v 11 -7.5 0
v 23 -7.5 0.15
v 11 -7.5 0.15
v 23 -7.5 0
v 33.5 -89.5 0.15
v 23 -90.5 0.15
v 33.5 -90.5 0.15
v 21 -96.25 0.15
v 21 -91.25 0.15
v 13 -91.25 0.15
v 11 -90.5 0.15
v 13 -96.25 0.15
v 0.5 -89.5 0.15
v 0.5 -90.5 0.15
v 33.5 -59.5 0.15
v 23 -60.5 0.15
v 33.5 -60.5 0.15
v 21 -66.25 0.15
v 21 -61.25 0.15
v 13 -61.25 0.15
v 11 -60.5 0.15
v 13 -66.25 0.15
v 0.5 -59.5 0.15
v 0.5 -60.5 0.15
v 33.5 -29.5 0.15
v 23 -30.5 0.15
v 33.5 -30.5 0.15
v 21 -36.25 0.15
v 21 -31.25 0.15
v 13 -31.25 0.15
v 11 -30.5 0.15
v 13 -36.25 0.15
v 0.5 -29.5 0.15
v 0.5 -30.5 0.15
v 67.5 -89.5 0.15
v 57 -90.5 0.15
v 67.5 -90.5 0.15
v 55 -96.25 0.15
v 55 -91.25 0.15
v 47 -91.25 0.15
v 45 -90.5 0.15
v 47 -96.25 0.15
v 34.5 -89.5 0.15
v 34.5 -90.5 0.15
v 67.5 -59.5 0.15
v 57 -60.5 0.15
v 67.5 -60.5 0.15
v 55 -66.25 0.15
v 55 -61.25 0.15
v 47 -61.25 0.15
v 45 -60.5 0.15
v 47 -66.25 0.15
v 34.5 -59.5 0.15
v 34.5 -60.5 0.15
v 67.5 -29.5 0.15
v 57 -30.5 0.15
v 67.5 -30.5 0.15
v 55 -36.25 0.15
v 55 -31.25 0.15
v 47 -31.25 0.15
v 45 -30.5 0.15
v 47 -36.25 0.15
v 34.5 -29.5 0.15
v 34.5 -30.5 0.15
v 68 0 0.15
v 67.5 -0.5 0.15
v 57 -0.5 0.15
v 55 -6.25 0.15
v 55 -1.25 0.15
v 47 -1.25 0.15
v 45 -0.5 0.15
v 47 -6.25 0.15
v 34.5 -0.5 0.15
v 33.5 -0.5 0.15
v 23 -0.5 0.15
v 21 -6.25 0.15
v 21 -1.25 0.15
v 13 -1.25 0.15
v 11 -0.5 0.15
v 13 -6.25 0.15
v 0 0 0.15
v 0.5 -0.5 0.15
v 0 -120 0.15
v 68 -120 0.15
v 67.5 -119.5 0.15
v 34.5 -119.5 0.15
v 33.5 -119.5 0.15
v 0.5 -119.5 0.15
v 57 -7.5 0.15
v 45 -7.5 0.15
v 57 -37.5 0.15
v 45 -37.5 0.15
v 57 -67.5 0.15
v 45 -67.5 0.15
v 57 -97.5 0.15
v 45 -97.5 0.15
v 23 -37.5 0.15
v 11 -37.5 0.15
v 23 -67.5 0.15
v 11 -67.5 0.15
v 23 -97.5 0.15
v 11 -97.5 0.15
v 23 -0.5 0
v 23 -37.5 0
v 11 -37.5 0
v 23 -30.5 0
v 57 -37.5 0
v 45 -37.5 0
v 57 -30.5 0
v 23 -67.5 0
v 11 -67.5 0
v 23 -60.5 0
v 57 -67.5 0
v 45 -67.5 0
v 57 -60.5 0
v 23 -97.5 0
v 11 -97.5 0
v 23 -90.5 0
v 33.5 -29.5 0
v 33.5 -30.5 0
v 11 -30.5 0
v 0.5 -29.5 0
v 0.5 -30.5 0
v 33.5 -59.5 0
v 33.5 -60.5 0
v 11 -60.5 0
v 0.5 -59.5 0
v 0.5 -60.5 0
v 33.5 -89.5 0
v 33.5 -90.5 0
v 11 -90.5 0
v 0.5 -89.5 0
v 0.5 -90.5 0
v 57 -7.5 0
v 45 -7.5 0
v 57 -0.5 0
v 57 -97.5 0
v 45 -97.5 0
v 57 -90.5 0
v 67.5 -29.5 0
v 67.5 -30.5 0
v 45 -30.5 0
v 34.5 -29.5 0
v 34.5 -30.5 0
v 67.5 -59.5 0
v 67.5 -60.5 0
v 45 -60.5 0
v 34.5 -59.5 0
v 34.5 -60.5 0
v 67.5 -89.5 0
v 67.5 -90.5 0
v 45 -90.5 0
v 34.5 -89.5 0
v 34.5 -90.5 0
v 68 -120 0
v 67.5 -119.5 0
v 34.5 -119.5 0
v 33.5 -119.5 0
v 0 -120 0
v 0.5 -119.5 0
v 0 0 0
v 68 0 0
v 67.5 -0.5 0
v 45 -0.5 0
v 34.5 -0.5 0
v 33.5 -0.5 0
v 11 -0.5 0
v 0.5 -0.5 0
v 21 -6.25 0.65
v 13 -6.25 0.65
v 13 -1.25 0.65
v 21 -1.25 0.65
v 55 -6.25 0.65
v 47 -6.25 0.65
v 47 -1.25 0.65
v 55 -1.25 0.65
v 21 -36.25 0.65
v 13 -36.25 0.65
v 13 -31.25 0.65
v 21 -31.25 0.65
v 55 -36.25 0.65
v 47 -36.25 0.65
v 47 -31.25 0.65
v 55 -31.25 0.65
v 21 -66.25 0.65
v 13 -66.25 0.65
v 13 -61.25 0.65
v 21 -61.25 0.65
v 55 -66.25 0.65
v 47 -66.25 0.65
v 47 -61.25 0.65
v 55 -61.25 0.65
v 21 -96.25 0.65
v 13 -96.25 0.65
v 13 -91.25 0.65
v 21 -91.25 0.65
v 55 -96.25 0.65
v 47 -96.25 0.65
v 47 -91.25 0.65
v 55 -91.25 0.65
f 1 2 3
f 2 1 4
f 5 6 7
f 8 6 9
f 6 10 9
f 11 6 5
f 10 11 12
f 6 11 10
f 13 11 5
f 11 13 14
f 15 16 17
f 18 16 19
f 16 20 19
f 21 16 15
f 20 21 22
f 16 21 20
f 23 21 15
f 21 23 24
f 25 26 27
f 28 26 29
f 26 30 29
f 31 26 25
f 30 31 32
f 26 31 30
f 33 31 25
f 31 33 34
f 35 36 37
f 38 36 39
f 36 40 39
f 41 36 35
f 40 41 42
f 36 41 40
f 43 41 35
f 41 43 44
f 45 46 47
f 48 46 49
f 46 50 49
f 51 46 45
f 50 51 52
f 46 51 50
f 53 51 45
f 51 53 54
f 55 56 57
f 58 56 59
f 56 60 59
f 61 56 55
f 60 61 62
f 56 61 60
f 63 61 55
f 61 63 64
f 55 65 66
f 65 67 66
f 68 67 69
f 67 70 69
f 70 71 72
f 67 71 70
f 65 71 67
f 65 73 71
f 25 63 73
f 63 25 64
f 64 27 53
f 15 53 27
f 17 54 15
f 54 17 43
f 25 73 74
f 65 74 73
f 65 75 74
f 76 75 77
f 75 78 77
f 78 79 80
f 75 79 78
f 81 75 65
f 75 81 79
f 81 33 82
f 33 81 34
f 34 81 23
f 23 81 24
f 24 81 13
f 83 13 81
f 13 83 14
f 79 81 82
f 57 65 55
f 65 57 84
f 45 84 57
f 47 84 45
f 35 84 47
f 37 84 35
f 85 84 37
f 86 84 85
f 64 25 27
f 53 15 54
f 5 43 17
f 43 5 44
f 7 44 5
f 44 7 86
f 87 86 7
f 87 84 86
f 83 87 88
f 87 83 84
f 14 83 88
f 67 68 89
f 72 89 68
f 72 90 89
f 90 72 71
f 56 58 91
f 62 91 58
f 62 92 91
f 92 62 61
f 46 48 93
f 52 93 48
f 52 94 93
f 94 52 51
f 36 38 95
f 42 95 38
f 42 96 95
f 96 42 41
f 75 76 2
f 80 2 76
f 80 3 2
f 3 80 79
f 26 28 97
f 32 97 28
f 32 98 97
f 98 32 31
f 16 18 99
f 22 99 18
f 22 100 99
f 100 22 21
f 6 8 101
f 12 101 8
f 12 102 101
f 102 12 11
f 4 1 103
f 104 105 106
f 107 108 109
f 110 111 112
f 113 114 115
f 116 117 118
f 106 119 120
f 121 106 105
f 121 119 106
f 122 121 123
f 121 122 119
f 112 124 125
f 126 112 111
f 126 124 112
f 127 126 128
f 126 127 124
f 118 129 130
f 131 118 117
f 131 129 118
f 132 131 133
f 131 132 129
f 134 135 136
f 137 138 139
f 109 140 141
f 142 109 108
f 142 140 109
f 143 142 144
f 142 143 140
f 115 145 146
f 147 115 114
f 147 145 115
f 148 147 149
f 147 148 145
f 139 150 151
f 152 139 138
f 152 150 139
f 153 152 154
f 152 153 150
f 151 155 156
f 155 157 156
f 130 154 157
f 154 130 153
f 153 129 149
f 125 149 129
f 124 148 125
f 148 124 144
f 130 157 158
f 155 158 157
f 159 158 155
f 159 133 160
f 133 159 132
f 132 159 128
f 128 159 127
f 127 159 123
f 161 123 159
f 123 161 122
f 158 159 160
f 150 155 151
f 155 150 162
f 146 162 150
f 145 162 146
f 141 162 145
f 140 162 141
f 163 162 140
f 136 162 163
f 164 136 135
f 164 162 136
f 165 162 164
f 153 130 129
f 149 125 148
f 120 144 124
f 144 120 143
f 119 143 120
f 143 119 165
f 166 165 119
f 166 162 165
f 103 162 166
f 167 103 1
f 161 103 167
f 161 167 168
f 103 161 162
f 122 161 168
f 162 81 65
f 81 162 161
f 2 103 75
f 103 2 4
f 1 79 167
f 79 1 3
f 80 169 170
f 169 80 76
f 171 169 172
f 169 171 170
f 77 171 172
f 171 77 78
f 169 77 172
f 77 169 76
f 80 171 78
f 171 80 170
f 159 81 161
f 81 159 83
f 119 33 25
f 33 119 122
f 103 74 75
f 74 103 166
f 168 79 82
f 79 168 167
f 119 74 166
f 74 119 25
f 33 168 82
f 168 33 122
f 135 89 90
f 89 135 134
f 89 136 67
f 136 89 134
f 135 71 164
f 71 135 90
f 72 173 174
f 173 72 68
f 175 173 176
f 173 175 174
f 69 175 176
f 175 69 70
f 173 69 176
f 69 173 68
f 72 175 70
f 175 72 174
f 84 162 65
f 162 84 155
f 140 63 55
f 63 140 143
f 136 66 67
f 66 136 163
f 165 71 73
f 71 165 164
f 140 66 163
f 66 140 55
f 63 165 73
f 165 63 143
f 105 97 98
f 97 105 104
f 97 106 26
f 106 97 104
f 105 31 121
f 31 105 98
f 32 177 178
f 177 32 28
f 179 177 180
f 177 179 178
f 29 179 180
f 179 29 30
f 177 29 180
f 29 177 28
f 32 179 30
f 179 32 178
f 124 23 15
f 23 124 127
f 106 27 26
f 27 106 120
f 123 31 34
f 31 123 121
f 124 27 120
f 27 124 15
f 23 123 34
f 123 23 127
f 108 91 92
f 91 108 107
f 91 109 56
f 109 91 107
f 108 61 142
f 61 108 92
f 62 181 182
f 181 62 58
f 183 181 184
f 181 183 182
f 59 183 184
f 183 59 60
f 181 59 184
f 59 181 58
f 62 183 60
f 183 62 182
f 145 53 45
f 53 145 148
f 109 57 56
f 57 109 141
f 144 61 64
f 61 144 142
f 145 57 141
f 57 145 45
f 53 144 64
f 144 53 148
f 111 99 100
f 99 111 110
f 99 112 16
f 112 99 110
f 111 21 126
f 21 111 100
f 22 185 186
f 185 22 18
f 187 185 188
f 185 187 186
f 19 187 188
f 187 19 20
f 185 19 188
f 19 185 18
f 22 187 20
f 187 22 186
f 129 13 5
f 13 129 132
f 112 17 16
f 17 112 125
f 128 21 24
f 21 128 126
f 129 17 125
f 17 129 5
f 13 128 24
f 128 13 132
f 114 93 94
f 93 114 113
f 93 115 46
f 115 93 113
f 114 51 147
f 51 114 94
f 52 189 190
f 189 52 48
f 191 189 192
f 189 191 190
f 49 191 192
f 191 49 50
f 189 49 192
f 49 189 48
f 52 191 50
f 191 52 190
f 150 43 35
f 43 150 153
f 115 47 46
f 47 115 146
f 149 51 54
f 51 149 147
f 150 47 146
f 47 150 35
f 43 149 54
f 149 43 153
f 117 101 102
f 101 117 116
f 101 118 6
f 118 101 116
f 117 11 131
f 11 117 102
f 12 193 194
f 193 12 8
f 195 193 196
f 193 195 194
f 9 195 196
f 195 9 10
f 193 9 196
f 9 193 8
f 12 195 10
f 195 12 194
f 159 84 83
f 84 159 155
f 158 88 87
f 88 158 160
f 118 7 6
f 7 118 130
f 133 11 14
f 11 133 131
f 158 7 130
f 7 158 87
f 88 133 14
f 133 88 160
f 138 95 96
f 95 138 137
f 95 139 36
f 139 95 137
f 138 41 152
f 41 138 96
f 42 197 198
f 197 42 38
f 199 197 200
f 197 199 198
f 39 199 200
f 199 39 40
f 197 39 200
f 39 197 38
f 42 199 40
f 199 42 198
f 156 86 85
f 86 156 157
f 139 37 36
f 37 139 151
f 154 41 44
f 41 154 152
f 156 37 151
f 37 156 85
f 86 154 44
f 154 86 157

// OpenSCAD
patternFields = 8;

plateX = 120;
plateY = 68;

labelX = 5;
labelY = 8;
labelPadX = 1.5 * labelX;
labelPadY = 1.5 * labelY;
patternHeight = 0.150;
labelHeight = patternHeight + 0.5;
patternWall = 1;
finalRotate = -90;


splits = [
[ -1, -1],
[ -1, -1],
[ 2, 1],
[ -1, -1],
[ 2, 2],
[ -1, -1],
[ 3, 2],
[ -1, -1],
[ 4, 2],
[ 3, 3],
];

*color("white") cube([plateX, plateY, 0.01]);

count = splits[patternFields];
echo(count[0], count[1]);

px = 0;
py = 0;
x = plateX / count[0];
y = plateY / count[1];
rotate([0, 0, finalRotate])
for (px = [0 : x : plateX-1]) {
	for (py = [0 : y : plateY-1]) {
		translate([px, py, 0]) union() {
			translate([0, (y - labelPadY) / 2]) union() {
				cube([labelPadX, labelPadY, patternHeight]);
				translate([(labelPadX - labelX) / 2, (labelPadY - labelY) / 2, 0])
					cube([labelX, labelY, labelHeight]);
			}
			difference() {
				cube([x, y, patternHeight]);
				translate([patternWall / 2, patternWall / 2, -0.05])
					cube([x - patternWall, y - patternWall, patternHeight + 0.1]);
			}
		}
	}
}
